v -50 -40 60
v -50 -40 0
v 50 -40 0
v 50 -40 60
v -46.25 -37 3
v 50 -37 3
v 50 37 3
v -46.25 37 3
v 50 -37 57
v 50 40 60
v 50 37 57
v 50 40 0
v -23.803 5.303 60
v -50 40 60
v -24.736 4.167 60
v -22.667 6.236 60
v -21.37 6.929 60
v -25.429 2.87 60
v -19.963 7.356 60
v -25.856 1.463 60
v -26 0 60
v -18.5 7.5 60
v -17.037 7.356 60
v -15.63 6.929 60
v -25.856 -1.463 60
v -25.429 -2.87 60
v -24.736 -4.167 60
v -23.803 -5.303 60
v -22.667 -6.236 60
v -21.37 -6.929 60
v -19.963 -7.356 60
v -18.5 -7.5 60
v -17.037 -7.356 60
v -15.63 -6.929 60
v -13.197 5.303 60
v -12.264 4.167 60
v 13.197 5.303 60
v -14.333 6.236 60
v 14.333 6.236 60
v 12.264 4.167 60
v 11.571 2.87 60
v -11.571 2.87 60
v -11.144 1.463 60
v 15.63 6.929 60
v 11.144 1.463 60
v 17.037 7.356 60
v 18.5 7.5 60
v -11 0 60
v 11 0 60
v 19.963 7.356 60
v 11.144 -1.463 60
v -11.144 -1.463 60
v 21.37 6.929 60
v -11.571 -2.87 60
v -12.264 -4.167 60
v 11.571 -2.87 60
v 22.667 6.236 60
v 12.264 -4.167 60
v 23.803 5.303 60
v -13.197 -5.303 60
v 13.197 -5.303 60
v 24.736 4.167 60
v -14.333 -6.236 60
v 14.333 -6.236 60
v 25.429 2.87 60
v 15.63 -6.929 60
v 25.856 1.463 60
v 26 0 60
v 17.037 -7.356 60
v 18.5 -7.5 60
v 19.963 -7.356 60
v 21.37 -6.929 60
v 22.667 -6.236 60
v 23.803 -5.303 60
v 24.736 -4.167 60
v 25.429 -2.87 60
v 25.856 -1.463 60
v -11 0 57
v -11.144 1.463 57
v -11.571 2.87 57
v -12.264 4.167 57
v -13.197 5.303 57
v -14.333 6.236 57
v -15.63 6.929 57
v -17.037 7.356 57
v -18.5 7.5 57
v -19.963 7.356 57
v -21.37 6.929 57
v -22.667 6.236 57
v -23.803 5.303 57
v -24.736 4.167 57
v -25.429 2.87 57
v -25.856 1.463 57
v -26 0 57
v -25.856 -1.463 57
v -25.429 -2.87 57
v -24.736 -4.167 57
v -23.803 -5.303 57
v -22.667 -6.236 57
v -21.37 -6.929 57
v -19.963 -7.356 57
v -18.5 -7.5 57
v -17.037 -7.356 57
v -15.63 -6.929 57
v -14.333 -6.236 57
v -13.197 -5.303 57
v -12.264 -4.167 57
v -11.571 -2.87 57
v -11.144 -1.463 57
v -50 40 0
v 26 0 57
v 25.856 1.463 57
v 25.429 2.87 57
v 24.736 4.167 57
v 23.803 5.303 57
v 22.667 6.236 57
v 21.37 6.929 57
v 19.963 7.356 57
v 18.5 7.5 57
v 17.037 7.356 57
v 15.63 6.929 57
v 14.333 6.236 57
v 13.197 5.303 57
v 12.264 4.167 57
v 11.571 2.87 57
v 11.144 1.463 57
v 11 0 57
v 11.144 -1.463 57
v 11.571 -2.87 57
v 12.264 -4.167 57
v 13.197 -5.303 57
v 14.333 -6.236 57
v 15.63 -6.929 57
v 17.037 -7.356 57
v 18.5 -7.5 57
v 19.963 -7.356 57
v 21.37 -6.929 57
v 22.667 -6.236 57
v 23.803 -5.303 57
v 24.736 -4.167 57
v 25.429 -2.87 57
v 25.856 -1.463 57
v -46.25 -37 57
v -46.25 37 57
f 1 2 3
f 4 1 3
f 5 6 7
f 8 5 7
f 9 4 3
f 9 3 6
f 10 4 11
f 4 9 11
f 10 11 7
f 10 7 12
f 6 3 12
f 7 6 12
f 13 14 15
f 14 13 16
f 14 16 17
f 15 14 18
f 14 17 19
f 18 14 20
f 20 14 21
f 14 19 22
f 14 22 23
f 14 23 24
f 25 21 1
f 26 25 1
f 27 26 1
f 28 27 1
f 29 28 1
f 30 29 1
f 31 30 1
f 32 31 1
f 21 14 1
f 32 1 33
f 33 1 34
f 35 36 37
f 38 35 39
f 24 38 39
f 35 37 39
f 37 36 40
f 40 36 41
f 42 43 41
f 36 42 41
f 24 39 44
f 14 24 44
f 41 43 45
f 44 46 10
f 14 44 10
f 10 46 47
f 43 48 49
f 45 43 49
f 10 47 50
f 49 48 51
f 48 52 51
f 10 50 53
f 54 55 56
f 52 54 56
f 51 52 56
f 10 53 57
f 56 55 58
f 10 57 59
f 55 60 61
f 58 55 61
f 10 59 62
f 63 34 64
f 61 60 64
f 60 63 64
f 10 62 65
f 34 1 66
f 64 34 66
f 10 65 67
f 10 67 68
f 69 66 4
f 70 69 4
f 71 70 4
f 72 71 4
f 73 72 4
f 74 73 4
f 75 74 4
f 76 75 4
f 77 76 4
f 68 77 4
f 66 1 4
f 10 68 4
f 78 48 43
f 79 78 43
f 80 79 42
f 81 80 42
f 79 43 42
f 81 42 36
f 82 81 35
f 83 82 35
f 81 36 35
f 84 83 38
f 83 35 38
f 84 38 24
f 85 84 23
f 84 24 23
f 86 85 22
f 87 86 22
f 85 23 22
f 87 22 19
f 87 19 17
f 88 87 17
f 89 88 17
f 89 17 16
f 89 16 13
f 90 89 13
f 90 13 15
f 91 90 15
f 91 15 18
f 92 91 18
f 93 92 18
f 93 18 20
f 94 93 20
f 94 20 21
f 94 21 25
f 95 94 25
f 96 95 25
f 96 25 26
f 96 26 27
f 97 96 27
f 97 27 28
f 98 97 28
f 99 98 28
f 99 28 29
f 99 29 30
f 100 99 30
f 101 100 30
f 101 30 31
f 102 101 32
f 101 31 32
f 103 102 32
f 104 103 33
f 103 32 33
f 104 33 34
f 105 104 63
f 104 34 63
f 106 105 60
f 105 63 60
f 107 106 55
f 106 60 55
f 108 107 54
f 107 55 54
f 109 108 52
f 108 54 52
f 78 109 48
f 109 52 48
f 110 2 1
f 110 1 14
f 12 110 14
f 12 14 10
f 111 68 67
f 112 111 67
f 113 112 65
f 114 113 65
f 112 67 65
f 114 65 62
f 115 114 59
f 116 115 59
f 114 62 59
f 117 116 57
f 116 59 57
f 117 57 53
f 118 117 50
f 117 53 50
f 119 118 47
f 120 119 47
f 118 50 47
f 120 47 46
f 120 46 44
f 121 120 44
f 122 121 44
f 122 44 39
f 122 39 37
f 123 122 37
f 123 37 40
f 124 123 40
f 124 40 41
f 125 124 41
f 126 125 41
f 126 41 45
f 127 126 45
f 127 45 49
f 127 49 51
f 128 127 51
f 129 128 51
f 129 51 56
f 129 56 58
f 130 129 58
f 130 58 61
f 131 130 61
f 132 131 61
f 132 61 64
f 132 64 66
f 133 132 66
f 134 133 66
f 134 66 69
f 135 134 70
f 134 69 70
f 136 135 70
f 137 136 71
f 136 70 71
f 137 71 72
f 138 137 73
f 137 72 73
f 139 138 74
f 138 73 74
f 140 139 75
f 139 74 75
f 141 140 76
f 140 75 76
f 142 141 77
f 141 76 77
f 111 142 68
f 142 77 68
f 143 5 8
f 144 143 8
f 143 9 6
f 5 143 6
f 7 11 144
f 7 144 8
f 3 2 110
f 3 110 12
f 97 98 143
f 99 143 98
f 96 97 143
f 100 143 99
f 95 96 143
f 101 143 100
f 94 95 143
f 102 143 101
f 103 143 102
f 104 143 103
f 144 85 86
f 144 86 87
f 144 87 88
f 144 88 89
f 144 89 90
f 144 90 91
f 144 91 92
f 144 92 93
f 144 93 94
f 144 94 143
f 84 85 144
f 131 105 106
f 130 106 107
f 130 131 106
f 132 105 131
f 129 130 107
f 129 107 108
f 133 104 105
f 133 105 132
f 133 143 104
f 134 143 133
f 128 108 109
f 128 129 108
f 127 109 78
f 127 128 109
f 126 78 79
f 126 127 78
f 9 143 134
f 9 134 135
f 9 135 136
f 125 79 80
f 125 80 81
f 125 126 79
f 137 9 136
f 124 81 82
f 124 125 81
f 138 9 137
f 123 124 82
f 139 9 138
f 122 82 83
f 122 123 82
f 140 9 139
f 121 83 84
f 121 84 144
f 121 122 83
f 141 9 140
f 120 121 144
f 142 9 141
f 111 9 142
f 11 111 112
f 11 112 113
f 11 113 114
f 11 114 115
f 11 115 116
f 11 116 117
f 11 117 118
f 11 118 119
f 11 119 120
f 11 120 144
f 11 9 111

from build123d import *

# Parameters (mm, degrees)
SKETCH1_W           = 100
SKETCH1_H           = 80
SKETCH1_W_2         = 92.5
SKETCH1_H_2         = 74
BOSS_EXTRUDE1_DEPTH = 60
SKETCH2_W           = 92.5
SKETCH2_H           = 3
BOSS_EXTRUDE2_DEPTH = 77
SKETCH3_W           = 92.5
SKETCH3_H           = 3
BOSS_EXTRUDE3_DEPTH = 77
SKETCH4_W           = 54
SKETCH4_H           = 74
CUT_EXTRUDE1_DEPTH  = 77
SKETCH7_R           = 7.5
CUT_EXTRUDE2_DEPTH  = 10


with BuildPart() as part:
    # Sketch1 → Boss-Extrude1 (new body)
    with BuildSketch(Plane.XY):
        Rectangle(SKETCH1_W, SKETCH1_H)
        Rectangle(SKETCH1_W_2, SKETCH1_H_2, mode=Mode.SUBTRACT)
    extrude(amount=BOSS_EXTRUDE1_DEPTH)

    # Sketch2 → Boss-Extrude2 (add)
    with BuildSketch(Plane(origin=(0, -37, 0), x_dir=(1, 0, 0), z_dir=(0, 1, 0))):
        with Locations((0, -1.5)):
            Rectangle(SKETCH2_W, SKETCH2_H)
    extrude(amount=BOSS_EXTRUDE2_DEPTH)

    # Sketch3 → Boss-Extrude3 (add)
    with BuildSketch(Plane(origin=(0, -37, 0), x_dir=(1, 0, 0), z_dir=(0, 1, 0))):
        with Locations((0, -58.5)):
            Rectangle(SKETCH3_W, SKETCH3_H)
    extrude(amount=BOSS_EXTRUDE3_DEPTH)

    # Sketch4 → Cut-Extrude1 (cut)
    with BuildSketch(Plane(origin=(50, 0, 0), x_dir=(0, 0, -1), z_dir=(1, 0, 0))):
        with Locations((-30, 0)):
            Rectangle(SKETCH4_W, SKETCH4_H)
    extrude(amount=-CUT_EXTRUDE1_DEPTH, mode=Mode.SUBTRACT)

    # Sketch7 → Cut-Extrude2 (cut)
    with BuildSketch(Plane.XY.offset(60)):
        with BuildLine():
            ThreePointArc((11, 0), (18.5, -7.5), (26, 0))
            Line((26, 0), (18.5, 0))
            Line((18.5, 0), (11, 0))
        make_face()
        with BuildLine():
            Line((18.5, 0), (26, 0))
            ThreePointArc((26, 0), (18.5, 7.5), (11, 0))
            Line((11, 0), (18.5, 0))
        make_face()
        with Locations((-18.5, 0)):
            Circle(SKETCH7_R)
    extrude(amount=-CUT_EXTRUDE2_DEPTH, mode=Mode.SUBTRACT)


solid = part.part
